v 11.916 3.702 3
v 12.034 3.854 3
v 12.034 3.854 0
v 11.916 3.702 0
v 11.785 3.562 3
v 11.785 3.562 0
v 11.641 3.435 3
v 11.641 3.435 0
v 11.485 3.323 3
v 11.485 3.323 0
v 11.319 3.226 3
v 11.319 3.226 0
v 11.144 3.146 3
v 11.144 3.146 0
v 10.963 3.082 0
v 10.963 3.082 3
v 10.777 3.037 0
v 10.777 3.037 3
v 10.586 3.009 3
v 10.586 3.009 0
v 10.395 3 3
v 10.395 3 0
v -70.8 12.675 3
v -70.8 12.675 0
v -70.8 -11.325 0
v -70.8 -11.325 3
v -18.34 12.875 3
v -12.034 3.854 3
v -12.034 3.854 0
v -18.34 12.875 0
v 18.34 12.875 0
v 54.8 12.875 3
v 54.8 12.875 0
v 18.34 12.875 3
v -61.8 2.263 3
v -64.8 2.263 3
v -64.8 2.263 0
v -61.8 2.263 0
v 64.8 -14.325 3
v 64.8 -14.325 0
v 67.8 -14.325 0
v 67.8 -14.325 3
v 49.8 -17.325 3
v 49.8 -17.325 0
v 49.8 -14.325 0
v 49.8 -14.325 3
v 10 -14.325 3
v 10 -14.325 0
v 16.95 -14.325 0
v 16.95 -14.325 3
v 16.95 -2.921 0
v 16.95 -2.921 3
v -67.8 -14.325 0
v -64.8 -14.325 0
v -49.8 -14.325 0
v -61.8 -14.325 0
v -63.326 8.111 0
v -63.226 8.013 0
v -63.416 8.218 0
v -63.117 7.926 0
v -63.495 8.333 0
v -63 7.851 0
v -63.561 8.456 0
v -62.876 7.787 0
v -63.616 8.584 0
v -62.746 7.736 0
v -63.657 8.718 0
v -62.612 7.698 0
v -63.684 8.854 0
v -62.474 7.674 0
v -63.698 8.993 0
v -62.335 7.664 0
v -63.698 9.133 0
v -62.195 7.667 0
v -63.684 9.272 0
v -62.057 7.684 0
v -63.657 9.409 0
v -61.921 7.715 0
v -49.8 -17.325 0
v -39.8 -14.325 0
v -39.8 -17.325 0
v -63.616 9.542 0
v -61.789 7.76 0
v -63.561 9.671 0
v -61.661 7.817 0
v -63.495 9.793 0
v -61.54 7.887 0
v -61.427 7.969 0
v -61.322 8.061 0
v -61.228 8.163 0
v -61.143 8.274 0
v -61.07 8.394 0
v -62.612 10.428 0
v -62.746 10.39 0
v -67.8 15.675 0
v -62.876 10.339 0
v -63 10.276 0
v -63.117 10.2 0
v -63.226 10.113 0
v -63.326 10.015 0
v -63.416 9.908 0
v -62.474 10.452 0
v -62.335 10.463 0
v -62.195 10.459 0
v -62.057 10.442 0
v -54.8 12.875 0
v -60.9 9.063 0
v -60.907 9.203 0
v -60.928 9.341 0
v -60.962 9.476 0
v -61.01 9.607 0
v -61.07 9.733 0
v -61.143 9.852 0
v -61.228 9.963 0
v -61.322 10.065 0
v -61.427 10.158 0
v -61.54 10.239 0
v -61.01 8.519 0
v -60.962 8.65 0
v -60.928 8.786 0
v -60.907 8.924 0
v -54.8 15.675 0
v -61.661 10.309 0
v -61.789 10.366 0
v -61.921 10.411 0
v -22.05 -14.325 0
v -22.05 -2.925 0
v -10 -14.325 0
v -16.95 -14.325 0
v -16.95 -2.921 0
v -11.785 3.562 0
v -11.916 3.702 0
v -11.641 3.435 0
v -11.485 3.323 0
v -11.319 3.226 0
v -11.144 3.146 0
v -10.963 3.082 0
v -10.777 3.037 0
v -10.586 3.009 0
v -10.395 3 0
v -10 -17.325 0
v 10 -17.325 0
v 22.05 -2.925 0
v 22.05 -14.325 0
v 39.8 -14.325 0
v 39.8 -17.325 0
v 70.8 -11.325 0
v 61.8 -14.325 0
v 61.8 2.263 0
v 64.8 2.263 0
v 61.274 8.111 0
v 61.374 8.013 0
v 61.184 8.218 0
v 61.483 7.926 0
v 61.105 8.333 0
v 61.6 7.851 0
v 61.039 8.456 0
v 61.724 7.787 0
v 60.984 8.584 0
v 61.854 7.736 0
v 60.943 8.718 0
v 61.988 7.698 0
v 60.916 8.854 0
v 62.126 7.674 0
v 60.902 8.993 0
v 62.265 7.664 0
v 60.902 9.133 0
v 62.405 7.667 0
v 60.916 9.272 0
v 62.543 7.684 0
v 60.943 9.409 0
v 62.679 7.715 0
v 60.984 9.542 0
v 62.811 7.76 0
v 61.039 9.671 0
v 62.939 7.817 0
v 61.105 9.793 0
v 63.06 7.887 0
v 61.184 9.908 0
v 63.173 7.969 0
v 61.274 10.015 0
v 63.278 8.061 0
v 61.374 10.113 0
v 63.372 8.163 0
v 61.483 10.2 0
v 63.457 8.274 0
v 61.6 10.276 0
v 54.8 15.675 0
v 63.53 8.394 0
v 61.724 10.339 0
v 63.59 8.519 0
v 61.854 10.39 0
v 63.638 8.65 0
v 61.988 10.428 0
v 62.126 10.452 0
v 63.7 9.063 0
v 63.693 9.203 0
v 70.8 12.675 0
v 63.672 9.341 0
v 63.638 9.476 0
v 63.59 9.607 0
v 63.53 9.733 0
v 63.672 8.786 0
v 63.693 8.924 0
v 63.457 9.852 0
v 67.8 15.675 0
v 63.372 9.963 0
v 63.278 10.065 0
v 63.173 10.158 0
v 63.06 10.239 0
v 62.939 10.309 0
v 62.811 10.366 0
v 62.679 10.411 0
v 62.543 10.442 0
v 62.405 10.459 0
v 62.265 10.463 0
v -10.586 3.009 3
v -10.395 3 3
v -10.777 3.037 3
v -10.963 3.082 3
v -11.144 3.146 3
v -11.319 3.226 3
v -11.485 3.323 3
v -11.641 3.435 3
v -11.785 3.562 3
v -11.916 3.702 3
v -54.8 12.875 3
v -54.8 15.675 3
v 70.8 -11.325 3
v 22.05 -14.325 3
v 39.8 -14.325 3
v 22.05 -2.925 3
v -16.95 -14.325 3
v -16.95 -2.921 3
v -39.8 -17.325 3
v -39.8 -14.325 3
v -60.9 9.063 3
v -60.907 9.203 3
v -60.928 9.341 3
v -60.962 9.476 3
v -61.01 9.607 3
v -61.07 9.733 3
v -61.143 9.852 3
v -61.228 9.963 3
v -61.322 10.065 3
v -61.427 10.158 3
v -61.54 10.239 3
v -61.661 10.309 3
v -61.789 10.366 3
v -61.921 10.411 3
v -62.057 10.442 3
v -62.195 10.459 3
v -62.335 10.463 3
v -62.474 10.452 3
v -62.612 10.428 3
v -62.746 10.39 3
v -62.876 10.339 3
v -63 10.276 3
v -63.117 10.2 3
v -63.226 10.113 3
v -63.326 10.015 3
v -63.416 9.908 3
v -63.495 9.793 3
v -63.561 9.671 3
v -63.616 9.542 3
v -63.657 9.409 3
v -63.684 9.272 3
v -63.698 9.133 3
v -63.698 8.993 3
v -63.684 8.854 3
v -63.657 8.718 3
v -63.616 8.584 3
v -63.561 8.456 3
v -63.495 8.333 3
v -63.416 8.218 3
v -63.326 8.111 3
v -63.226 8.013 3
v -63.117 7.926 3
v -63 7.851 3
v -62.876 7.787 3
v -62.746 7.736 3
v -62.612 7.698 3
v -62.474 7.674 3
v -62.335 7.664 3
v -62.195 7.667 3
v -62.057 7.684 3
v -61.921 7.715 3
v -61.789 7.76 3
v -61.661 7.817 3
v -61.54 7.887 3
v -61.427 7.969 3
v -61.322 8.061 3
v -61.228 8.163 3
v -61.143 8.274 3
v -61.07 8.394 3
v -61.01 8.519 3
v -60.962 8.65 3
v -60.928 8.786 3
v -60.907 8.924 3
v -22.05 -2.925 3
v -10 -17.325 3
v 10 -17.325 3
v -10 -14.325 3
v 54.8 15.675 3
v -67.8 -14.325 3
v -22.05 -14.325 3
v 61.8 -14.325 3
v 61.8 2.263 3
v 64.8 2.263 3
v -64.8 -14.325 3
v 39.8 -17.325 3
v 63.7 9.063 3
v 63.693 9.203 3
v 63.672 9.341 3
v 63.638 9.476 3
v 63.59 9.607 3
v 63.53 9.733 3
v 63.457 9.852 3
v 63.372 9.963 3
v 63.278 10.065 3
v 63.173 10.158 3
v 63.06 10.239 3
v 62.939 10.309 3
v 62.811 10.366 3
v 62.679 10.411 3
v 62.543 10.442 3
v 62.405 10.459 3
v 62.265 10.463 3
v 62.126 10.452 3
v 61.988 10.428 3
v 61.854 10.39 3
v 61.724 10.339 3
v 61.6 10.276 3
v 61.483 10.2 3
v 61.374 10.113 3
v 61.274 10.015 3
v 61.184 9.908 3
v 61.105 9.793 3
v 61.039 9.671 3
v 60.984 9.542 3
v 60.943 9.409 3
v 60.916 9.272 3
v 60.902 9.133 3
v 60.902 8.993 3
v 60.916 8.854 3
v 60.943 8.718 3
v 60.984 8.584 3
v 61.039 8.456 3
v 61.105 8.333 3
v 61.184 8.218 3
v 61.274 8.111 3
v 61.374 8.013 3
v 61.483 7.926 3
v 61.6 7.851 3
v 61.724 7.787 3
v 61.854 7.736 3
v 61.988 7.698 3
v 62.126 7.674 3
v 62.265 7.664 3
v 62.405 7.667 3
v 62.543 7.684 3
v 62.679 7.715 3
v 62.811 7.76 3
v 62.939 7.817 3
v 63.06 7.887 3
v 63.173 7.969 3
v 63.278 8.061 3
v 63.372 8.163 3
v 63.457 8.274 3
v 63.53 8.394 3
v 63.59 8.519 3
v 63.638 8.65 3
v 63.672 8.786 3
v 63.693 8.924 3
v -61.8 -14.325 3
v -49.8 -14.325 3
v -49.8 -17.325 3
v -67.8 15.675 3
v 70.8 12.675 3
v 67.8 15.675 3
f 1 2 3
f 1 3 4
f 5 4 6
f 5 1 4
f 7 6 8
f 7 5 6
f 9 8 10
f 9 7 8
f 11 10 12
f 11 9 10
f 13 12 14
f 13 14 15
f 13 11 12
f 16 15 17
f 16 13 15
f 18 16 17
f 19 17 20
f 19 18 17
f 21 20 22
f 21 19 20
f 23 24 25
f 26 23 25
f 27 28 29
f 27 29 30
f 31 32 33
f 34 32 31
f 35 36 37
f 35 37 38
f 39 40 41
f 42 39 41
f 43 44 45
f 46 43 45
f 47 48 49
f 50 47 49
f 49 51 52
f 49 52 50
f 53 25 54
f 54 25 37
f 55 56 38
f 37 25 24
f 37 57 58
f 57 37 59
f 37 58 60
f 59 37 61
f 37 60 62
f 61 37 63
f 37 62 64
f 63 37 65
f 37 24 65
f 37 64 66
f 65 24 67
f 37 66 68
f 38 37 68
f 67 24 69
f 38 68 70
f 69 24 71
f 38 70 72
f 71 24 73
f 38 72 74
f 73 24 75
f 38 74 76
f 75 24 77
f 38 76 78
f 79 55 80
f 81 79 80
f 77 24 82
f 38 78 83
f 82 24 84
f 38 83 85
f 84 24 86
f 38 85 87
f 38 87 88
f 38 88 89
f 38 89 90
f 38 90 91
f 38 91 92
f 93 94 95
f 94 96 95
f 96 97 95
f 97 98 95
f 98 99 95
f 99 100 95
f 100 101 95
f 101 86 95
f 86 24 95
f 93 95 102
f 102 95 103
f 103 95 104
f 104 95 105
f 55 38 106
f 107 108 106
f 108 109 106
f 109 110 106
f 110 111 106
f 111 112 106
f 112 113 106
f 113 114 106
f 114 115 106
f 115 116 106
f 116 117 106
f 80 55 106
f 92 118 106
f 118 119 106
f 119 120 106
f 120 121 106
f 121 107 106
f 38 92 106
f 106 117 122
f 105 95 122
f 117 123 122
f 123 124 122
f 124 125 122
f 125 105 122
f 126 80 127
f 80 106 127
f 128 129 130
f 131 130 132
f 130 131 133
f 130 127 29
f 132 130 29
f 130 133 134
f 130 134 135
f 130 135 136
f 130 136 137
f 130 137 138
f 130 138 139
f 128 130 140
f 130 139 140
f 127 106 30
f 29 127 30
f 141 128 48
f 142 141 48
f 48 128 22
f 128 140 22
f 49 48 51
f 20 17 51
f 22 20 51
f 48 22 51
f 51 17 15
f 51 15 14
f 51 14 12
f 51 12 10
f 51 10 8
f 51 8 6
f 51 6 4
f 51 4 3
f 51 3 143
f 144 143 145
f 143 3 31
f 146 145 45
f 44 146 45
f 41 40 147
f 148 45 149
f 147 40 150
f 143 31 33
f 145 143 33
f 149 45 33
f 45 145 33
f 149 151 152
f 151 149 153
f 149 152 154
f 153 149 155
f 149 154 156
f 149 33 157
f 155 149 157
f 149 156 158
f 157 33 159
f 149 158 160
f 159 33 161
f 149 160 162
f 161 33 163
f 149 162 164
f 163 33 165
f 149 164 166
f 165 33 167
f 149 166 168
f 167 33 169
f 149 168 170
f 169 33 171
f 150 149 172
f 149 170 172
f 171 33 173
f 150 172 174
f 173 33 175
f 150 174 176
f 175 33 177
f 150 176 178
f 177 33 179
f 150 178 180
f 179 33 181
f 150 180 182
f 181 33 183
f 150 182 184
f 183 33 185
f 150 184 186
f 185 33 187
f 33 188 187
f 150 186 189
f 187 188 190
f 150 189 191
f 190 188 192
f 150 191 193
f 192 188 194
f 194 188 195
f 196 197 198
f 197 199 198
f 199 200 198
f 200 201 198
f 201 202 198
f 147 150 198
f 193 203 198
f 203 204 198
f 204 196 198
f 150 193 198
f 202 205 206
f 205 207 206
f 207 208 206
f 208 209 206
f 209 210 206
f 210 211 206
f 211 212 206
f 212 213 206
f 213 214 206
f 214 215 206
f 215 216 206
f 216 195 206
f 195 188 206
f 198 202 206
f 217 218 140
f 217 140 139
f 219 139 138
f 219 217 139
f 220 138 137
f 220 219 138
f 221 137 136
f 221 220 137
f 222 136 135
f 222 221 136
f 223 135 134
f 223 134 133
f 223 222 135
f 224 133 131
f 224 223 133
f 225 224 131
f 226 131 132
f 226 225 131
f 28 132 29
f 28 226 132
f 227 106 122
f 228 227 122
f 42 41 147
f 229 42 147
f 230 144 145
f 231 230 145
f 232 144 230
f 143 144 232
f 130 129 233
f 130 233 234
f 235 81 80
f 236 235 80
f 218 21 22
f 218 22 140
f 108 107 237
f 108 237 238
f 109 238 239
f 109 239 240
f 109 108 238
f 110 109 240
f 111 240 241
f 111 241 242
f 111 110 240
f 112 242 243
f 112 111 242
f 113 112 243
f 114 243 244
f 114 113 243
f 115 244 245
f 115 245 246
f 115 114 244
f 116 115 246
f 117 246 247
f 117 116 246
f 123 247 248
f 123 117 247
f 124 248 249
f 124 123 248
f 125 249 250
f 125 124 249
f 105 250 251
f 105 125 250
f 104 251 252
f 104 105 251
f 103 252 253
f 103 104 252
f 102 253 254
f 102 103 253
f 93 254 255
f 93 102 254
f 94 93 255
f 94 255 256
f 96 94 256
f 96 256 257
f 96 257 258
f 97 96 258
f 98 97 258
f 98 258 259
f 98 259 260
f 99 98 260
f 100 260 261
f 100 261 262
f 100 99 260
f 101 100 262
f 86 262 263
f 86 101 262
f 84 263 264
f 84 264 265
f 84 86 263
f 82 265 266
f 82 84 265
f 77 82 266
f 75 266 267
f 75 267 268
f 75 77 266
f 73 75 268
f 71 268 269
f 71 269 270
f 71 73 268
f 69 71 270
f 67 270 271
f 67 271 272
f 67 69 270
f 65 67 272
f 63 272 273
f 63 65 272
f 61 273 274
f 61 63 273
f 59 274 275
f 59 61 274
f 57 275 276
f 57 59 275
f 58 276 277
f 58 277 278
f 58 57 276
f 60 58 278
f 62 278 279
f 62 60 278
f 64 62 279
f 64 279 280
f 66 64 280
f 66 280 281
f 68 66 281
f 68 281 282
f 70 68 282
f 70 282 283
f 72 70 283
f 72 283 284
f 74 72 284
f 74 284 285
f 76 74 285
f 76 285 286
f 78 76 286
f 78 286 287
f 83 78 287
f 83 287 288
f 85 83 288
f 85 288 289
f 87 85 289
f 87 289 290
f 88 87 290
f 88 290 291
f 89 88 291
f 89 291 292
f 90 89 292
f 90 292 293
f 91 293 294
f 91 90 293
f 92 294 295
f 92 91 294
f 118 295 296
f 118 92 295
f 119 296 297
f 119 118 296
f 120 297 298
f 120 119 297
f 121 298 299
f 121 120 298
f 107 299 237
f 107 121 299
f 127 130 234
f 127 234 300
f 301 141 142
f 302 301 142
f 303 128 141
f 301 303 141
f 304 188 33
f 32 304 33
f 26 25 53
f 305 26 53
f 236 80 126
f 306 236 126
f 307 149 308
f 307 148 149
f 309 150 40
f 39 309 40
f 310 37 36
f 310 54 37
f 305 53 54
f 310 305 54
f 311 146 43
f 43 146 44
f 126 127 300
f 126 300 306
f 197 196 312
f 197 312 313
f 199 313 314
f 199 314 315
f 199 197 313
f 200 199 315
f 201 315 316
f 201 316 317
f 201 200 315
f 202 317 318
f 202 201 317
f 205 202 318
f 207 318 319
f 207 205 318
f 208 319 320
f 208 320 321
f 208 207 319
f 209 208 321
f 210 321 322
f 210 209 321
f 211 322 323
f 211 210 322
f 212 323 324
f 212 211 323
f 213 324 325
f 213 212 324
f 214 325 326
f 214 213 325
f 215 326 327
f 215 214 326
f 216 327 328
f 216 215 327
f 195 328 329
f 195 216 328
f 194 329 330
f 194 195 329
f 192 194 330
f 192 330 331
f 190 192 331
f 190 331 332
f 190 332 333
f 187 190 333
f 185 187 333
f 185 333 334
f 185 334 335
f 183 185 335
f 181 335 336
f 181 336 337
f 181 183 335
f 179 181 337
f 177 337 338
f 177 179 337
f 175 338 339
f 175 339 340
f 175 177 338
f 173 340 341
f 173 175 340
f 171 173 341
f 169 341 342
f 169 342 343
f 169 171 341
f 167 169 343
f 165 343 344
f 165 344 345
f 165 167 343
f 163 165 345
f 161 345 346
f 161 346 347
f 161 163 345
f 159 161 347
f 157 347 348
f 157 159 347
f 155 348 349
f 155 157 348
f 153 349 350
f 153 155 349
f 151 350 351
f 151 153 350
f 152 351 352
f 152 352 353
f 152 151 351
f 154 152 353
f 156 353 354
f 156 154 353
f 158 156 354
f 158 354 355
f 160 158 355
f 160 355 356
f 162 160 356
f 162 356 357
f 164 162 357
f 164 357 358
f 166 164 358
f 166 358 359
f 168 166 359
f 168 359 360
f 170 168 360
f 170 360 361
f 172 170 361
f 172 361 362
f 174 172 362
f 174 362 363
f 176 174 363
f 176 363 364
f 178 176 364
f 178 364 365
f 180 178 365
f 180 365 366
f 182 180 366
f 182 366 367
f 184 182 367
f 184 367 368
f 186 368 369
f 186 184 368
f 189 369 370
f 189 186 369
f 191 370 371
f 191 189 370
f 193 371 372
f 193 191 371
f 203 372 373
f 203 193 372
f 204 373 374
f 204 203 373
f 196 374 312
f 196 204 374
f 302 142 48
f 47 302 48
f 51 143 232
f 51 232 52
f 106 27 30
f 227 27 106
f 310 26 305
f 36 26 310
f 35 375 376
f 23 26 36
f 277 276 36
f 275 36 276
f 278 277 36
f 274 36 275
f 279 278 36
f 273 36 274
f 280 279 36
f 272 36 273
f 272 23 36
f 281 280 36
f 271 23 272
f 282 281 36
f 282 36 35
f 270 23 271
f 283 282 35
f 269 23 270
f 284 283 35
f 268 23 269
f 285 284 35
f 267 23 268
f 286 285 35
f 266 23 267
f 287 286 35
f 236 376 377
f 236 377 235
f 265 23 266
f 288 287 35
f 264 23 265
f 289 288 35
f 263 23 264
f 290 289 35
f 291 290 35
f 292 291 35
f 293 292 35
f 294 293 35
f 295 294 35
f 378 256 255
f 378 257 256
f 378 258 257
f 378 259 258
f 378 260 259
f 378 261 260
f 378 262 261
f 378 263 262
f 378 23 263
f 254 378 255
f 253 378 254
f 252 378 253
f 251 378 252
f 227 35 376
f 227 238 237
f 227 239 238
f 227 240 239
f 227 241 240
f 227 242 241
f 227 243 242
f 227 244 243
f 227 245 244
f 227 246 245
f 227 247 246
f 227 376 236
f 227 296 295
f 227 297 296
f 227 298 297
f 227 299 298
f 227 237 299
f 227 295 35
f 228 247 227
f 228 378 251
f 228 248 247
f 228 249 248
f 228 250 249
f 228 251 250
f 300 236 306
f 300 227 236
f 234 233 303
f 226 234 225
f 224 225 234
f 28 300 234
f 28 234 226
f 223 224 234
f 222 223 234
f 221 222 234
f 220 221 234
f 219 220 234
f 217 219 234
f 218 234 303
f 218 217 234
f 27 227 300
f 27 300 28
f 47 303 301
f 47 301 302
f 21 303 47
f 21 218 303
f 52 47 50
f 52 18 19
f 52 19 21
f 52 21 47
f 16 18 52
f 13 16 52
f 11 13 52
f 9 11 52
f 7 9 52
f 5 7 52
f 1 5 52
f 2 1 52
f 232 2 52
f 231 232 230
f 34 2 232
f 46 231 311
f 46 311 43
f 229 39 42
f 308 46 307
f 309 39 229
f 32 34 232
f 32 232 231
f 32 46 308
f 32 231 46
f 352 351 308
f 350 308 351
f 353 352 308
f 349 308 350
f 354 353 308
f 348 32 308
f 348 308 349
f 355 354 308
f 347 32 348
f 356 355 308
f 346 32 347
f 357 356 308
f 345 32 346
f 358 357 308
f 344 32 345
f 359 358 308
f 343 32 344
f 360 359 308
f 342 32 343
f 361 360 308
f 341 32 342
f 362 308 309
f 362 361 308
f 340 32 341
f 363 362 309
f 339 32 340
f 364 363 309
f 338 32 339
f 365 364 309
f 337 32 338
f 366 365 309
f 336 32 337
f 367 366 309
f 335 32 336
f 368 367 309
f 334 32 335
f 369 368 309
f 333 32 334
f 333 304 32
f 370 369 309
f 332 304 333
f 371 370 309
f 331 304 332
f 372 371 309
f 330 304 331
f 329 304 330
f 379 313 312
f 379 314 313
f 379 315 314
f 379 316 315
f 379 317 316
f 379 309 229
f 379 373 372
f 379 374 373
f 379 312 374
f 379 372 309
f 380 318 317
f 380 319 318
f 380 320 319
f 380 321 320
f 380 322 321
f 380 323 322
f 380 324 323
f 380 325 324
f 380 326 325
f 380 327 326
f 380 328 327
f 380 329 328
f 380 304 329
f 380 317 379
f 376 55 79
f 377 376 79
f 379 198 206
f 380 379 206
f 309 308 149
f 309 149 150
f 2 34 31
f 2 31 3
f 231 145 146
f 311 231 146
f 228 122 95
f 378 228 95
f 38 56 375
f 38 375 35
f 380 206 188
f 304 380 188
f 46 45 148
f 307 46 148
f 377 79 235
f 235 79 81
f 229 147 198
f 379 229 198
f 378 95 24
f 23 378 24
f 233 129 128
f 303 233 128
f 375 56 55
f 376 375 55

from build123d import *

# Parameters (mm, degrees)
SKETCH_1_R          = 1.4
SKETCH_1_W          = 3
SKETCH_1_H          = 12
EXTRUDE_1_DEPTH     = 3
SKETCH_2_W          = 20
SKETCH_2_H          = 3
EXTRUDE_2_DEPTH     = 2.8
SKETCH_3_W          = 3
SKETCH_3_H          = 12
EXTRUDE_3_DEPTH     = 3
SKETCH_4_W          = 3
SKETCH_4_H          = 3.946305982
CUT_EXTRUDE_1_DEPTH = 3
SKETCH_5_W          = 3
SKETCH_5_H          = 3
CUT_EXTRUDE_2_DEPTH = 1
SKETCH_7_W          = 3
SKETCH_7_H          = 2.8
CUT_EXTRUDE_4_DEPTH = 60
CUT_EXTRUDE_5_DEPTH = 60
EXTRUDE_4_DEPTH     = 3
FILLET_1_R          = 3
EXTRUDE_START       = -3
EXTRUDE_5_DEPTH     = 3
CUT_EXTRUDE_7_DEPTH = 10


with BuildPart() as part:
    # 草图1 → 凸台-拉伸1 (new body)
    with BuildSketch(Plane.XY):
        Polygon((-54.8, 15.675), (-67.8, 15.675), (-70.8, 12.675), (-70.8, -11.325), (-67.8, -14.325), (-49.8, -14.325), (-49.8, -17.325), (-39.8, -17.325), (-39.8, -14.325), (-22, -14.325), (-22, -2.975), (-17, -2.970818371), (-17, -14.325), (-10, -14.325), (-10, -17.325), (10, -17.325), (10, -14.325), (17, -14.325), (17, -2.970818371), (22, -2.975), (22, -14.325), (39.8, -14.325), (39.8, -17.325), (49.8, -17.325), (49.8, -14.325), (67.8, -14.325), (70.8, -11.325), (70.8, 12.675), (67.8, 15.675), (54.8, 15.675), (54.8, 12.875), (29.8, 12.875), (29.8, 15.675), (10, 15.675), (10, 12.875), (-10, 12.875), (-10, 15.675), (-29.8, 15.675), (-29.8, 12.875), (-54.8, 12.875), align=None)
        with Locations((-62.3, 9.063133886)):
            Circle(SKETCH_1_R, mode=Mode.SUBTRACT)
        with Locations((62.3, 9.063133886)):
            Circle(SKETCH_1_R, mode=Mode.SUBTRACT)
        with Locations((-63.3, -0.325)):
            Rectangle(SKETCH_1_W, SKETCH_1_H, mode=Mode.SUBTRACT)
        with Locations((63.3, -0.325)):
            Rectangle(SKETCH_1_W, SKETCH_1_H, mode=Mode.SUBTRACT)
    extrude(amount=EXTRUDE_1_DEPTH)

    # 草图2 → 凸台-拉伸2 (add)
    with BuildSketch(Plane(origin=(0, 12.875, 0), x_dir=(1, 0, 0), z_dir=(0, 1, 0))):
        with Locations((0, -1.5)):
            Rectangle(SKETCH_2_W, SKETCH_2_H)
    extrude(amount=EXTRUDE_2_DEPTH)

    # 草图3 → 凸台-拉伸3 (add)
    with BuildSketch(Plane.XY.offset(3)):
        with Locations((-63.3, -0.325)):
            Rectangle(SKETCH_3_W, SKETCH_3_H)
        with Locations((63.3, -0.325)):
            Rectangle(SKETCH_3_W, SKETCH_3_H)
    extrude(amount=-EXTRUDE_3_DEPTH)

    # 草图4 → 切除-拉伸1 (cut)
    with BuildSketch(Plane(origin=(133.943153128, -125.945742166, 0), x_dir=(1, 0, 0), z_dir=(0, 0, -1))):
        Polygon((-72.143153128, -111.674436184), (-72.143153128, -127.209199434), (-69.143153128, -127.209199434), (-69.143153128, -111.674436184), (-69.143153128, -111.620742166), (-72.143153128, -111.620742166), align=None)
        with Locations((-70.643153128, -109.647589175)):
            Rectangle(SKETCH_4_W, SKETCH_4_H)
    cut_extrude_1 = extrude(amount=-CUT_EXTRUDE_1_DEPTH, mode=Mode.SUBTRACT)

    # 镜向1: 切除-拉伸1 across plane
    add(cut_extrude_1.mirror(Plane.ZY), mode=Mode.SUBTRACT)

    # 草图5 → 切除-拉伸2 (cut)
    with BuildSketch(Plane.XZ.offset(-1.263457268)):
        with Locations((63.3, 1.5)):
            Rectangle(SKETCH_5_W, SKETCH_5_H)
        with Locations((-63.3, 1.5)):
            Rectangle(SKETCH_5_W, SKETCH_5_H)
    extrude(amount=-CUT_EXTRUDE_2_DEPTH, mode=Mode.SUBTRACT)

    # 草图7 → 切除-拉伸4 (cut)
    with BuildSketch(Plane(origin=(29.8, 0, 0), x_dir=(0, 0, -1), z_dir=(1, 0, 0))):
        with Locations((-1.5, 14.275)):
            Rectangle(SKETCH_7_W, SKETCH_7_H)
    extrude(amount=-CUT_EXTRUDE_4_DEPTH, mode=Mode.SUBTRACT)

    # 草图8 → 切除-拉伸5 (cut)
    with BuildSketch(Plane(origin=(0, 0, 0), x_dir=(-1, 0, 0), z_dir=(0, 0, -1))):
        Polygon((-8, 0), (-13, 0), (-22, 12.875), (-17, 12.875), (17, 12.875), (22, 12.875), (13, 0), (8, 0), (0, 0), align=None)
    extrude(amount=-CUT_EXTRUDE_5_DEPTH, mode=Mode.SUBTRACT)

    # 草图10 → 凸台-拉伸4 (add)
    with BuildSketch(Plane(origin=(0, 0, 0), x_dir=(-1, 0, 0), z_dir=(0, 0, -1))):
        Polygon((-22, 12.875), (-13, 0), (13, 0), (22, 12.875), (19.559801877, 12.875), (11.95786013, 2), (-11.95786013, 2), (-19.559801877, 12.875), align=None)
    extrude(amount=-EXTRUDE_4_DEPTH)

    # 圆角1
    fillet_1_edges = [part.edges().sort_by_distance(p)[0] for p in [
        (-11.95786013, 2, 1.5),
        (11.95786013, 2, 1.5),
    ]]
    fillet(fillet_1_edges, radius=FILLET_1_R)

    # 草图11 → 凸台-拉伸5 (add)
    with BuildSketch(Plane(origin=(0, 0, 0), x_dir=(-1, 0, 0), z_dir=(0, 0, -1)).offset(EXTRUDE_START)):
        with BuildLine():
            Line((-12.853467068, 3.281215481), (-19.559801877, 12.875))
            Line((-19.559801877, 12.875), (-18.339702816, 12.875))
            Line((-18.339702816, 12.875), (-12.033861487, 3.854143654))
            ThreePointArc((-12.033861487, 3.854143654), (-11.31884925, 3.226343791), (-10.394650325, 3))
            Line((-10.394650325, 3), (10.394650325, 3))
            ThreePointArc((10.394650325, 3), (11.31884925, 3.226343791), (12.033861487, 3.854143654))
            Line((12.033861487, 3.854143654), (18.339702816, 12.875))
            Line((18.339702816, 12.875), (19.559801877, 12.875))
            Line((19.559801877, 12.875), (12.853467068, 3.281215481))
            ThreePointArc((12.853467068, 3.281215481), (11.780948713, 2.339515687), (10.394650325, 2))
            Line((10.394650325, 2), (-10.394650325, 2))
            ThreePointArc((-10.394650325, 2), (-11.780948713, 2.339515687), (-12.853467068, 3.281215481))
        make_face()
    extrude(amount=EXTRUDE_5_DEPTH)

    # 草图12 → 切除-拉伸7 (cut)
    with BuildSketch(Plane(origin=(0, 0, 0), x_dir=(-1, 0, 0), z_dir=(0, 0, -1))):
        Polygon((-22, -2.975), (-22, -14.325), (-22.05, -14.325), (-22.05, -2.925041799), (-16.95, -2.920776537), (-16.95, -14.325), (-17, -14.325), (-17, -2.970818371), align=None)
        Polygon((17, -2.970818371), (17, -14.325), (16.95, -14.325), (16.95, -2.920776537), (22.05, -2.925041799), (22.05, -14.325), (22, -14.325), (22, -2.975), align=None)
    extrude(amount=-CUT_EXTRUDE_7_DEPTH, mode=Mode.SUBTRACT)


solid = part.part
